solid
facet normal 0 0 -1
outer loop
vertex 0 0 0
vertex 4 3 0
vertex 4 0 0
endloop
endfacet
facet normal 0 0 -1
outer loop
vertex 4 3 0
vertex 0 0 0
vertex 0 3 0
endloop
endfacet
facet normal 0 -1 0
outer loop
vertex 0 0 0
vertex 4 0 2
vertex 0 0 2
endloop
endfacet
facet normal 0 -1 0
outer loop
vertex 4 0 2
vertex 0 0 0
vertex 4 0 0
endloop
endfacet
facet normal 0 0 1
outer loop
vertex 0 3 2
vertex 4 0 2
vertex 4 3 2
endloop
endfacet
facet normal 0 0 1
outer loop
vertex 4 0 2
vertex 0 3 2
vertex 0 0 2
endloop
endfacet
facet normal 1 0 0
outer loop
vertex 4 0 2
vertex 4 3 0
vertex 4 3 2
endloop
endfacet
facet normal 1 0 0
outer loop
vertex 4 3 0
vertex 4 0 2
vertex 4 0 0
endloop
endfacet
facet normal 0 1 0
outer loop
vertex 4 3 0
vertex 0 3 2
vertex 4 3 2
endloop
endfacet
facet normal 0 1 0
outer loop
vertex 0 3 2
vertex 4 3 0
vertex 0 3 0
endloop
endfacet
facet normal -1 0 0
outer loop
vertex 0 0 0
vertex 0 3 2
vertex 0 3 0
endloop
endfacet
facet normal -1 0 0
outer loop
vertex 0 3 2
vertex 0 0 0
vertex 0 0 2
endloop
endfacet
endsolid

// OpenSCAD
// box with quadrilateral faces
points = [[0, 0, 0], [4, 0, 0], [4, 3, 0], [0, 3, 0],
          [0, 0, 2], [4, 0, 2], [4, 3, 2], [0, 3, 2]];
faces = [[0, 1, 2, 3], [4, 5, 1, 0], [7, 6, 5, 4],
         [5, 6, 2, 1], [6, 7, 3, 2], [7, 4, 0, 3]];
polyhedron(points, faces);
